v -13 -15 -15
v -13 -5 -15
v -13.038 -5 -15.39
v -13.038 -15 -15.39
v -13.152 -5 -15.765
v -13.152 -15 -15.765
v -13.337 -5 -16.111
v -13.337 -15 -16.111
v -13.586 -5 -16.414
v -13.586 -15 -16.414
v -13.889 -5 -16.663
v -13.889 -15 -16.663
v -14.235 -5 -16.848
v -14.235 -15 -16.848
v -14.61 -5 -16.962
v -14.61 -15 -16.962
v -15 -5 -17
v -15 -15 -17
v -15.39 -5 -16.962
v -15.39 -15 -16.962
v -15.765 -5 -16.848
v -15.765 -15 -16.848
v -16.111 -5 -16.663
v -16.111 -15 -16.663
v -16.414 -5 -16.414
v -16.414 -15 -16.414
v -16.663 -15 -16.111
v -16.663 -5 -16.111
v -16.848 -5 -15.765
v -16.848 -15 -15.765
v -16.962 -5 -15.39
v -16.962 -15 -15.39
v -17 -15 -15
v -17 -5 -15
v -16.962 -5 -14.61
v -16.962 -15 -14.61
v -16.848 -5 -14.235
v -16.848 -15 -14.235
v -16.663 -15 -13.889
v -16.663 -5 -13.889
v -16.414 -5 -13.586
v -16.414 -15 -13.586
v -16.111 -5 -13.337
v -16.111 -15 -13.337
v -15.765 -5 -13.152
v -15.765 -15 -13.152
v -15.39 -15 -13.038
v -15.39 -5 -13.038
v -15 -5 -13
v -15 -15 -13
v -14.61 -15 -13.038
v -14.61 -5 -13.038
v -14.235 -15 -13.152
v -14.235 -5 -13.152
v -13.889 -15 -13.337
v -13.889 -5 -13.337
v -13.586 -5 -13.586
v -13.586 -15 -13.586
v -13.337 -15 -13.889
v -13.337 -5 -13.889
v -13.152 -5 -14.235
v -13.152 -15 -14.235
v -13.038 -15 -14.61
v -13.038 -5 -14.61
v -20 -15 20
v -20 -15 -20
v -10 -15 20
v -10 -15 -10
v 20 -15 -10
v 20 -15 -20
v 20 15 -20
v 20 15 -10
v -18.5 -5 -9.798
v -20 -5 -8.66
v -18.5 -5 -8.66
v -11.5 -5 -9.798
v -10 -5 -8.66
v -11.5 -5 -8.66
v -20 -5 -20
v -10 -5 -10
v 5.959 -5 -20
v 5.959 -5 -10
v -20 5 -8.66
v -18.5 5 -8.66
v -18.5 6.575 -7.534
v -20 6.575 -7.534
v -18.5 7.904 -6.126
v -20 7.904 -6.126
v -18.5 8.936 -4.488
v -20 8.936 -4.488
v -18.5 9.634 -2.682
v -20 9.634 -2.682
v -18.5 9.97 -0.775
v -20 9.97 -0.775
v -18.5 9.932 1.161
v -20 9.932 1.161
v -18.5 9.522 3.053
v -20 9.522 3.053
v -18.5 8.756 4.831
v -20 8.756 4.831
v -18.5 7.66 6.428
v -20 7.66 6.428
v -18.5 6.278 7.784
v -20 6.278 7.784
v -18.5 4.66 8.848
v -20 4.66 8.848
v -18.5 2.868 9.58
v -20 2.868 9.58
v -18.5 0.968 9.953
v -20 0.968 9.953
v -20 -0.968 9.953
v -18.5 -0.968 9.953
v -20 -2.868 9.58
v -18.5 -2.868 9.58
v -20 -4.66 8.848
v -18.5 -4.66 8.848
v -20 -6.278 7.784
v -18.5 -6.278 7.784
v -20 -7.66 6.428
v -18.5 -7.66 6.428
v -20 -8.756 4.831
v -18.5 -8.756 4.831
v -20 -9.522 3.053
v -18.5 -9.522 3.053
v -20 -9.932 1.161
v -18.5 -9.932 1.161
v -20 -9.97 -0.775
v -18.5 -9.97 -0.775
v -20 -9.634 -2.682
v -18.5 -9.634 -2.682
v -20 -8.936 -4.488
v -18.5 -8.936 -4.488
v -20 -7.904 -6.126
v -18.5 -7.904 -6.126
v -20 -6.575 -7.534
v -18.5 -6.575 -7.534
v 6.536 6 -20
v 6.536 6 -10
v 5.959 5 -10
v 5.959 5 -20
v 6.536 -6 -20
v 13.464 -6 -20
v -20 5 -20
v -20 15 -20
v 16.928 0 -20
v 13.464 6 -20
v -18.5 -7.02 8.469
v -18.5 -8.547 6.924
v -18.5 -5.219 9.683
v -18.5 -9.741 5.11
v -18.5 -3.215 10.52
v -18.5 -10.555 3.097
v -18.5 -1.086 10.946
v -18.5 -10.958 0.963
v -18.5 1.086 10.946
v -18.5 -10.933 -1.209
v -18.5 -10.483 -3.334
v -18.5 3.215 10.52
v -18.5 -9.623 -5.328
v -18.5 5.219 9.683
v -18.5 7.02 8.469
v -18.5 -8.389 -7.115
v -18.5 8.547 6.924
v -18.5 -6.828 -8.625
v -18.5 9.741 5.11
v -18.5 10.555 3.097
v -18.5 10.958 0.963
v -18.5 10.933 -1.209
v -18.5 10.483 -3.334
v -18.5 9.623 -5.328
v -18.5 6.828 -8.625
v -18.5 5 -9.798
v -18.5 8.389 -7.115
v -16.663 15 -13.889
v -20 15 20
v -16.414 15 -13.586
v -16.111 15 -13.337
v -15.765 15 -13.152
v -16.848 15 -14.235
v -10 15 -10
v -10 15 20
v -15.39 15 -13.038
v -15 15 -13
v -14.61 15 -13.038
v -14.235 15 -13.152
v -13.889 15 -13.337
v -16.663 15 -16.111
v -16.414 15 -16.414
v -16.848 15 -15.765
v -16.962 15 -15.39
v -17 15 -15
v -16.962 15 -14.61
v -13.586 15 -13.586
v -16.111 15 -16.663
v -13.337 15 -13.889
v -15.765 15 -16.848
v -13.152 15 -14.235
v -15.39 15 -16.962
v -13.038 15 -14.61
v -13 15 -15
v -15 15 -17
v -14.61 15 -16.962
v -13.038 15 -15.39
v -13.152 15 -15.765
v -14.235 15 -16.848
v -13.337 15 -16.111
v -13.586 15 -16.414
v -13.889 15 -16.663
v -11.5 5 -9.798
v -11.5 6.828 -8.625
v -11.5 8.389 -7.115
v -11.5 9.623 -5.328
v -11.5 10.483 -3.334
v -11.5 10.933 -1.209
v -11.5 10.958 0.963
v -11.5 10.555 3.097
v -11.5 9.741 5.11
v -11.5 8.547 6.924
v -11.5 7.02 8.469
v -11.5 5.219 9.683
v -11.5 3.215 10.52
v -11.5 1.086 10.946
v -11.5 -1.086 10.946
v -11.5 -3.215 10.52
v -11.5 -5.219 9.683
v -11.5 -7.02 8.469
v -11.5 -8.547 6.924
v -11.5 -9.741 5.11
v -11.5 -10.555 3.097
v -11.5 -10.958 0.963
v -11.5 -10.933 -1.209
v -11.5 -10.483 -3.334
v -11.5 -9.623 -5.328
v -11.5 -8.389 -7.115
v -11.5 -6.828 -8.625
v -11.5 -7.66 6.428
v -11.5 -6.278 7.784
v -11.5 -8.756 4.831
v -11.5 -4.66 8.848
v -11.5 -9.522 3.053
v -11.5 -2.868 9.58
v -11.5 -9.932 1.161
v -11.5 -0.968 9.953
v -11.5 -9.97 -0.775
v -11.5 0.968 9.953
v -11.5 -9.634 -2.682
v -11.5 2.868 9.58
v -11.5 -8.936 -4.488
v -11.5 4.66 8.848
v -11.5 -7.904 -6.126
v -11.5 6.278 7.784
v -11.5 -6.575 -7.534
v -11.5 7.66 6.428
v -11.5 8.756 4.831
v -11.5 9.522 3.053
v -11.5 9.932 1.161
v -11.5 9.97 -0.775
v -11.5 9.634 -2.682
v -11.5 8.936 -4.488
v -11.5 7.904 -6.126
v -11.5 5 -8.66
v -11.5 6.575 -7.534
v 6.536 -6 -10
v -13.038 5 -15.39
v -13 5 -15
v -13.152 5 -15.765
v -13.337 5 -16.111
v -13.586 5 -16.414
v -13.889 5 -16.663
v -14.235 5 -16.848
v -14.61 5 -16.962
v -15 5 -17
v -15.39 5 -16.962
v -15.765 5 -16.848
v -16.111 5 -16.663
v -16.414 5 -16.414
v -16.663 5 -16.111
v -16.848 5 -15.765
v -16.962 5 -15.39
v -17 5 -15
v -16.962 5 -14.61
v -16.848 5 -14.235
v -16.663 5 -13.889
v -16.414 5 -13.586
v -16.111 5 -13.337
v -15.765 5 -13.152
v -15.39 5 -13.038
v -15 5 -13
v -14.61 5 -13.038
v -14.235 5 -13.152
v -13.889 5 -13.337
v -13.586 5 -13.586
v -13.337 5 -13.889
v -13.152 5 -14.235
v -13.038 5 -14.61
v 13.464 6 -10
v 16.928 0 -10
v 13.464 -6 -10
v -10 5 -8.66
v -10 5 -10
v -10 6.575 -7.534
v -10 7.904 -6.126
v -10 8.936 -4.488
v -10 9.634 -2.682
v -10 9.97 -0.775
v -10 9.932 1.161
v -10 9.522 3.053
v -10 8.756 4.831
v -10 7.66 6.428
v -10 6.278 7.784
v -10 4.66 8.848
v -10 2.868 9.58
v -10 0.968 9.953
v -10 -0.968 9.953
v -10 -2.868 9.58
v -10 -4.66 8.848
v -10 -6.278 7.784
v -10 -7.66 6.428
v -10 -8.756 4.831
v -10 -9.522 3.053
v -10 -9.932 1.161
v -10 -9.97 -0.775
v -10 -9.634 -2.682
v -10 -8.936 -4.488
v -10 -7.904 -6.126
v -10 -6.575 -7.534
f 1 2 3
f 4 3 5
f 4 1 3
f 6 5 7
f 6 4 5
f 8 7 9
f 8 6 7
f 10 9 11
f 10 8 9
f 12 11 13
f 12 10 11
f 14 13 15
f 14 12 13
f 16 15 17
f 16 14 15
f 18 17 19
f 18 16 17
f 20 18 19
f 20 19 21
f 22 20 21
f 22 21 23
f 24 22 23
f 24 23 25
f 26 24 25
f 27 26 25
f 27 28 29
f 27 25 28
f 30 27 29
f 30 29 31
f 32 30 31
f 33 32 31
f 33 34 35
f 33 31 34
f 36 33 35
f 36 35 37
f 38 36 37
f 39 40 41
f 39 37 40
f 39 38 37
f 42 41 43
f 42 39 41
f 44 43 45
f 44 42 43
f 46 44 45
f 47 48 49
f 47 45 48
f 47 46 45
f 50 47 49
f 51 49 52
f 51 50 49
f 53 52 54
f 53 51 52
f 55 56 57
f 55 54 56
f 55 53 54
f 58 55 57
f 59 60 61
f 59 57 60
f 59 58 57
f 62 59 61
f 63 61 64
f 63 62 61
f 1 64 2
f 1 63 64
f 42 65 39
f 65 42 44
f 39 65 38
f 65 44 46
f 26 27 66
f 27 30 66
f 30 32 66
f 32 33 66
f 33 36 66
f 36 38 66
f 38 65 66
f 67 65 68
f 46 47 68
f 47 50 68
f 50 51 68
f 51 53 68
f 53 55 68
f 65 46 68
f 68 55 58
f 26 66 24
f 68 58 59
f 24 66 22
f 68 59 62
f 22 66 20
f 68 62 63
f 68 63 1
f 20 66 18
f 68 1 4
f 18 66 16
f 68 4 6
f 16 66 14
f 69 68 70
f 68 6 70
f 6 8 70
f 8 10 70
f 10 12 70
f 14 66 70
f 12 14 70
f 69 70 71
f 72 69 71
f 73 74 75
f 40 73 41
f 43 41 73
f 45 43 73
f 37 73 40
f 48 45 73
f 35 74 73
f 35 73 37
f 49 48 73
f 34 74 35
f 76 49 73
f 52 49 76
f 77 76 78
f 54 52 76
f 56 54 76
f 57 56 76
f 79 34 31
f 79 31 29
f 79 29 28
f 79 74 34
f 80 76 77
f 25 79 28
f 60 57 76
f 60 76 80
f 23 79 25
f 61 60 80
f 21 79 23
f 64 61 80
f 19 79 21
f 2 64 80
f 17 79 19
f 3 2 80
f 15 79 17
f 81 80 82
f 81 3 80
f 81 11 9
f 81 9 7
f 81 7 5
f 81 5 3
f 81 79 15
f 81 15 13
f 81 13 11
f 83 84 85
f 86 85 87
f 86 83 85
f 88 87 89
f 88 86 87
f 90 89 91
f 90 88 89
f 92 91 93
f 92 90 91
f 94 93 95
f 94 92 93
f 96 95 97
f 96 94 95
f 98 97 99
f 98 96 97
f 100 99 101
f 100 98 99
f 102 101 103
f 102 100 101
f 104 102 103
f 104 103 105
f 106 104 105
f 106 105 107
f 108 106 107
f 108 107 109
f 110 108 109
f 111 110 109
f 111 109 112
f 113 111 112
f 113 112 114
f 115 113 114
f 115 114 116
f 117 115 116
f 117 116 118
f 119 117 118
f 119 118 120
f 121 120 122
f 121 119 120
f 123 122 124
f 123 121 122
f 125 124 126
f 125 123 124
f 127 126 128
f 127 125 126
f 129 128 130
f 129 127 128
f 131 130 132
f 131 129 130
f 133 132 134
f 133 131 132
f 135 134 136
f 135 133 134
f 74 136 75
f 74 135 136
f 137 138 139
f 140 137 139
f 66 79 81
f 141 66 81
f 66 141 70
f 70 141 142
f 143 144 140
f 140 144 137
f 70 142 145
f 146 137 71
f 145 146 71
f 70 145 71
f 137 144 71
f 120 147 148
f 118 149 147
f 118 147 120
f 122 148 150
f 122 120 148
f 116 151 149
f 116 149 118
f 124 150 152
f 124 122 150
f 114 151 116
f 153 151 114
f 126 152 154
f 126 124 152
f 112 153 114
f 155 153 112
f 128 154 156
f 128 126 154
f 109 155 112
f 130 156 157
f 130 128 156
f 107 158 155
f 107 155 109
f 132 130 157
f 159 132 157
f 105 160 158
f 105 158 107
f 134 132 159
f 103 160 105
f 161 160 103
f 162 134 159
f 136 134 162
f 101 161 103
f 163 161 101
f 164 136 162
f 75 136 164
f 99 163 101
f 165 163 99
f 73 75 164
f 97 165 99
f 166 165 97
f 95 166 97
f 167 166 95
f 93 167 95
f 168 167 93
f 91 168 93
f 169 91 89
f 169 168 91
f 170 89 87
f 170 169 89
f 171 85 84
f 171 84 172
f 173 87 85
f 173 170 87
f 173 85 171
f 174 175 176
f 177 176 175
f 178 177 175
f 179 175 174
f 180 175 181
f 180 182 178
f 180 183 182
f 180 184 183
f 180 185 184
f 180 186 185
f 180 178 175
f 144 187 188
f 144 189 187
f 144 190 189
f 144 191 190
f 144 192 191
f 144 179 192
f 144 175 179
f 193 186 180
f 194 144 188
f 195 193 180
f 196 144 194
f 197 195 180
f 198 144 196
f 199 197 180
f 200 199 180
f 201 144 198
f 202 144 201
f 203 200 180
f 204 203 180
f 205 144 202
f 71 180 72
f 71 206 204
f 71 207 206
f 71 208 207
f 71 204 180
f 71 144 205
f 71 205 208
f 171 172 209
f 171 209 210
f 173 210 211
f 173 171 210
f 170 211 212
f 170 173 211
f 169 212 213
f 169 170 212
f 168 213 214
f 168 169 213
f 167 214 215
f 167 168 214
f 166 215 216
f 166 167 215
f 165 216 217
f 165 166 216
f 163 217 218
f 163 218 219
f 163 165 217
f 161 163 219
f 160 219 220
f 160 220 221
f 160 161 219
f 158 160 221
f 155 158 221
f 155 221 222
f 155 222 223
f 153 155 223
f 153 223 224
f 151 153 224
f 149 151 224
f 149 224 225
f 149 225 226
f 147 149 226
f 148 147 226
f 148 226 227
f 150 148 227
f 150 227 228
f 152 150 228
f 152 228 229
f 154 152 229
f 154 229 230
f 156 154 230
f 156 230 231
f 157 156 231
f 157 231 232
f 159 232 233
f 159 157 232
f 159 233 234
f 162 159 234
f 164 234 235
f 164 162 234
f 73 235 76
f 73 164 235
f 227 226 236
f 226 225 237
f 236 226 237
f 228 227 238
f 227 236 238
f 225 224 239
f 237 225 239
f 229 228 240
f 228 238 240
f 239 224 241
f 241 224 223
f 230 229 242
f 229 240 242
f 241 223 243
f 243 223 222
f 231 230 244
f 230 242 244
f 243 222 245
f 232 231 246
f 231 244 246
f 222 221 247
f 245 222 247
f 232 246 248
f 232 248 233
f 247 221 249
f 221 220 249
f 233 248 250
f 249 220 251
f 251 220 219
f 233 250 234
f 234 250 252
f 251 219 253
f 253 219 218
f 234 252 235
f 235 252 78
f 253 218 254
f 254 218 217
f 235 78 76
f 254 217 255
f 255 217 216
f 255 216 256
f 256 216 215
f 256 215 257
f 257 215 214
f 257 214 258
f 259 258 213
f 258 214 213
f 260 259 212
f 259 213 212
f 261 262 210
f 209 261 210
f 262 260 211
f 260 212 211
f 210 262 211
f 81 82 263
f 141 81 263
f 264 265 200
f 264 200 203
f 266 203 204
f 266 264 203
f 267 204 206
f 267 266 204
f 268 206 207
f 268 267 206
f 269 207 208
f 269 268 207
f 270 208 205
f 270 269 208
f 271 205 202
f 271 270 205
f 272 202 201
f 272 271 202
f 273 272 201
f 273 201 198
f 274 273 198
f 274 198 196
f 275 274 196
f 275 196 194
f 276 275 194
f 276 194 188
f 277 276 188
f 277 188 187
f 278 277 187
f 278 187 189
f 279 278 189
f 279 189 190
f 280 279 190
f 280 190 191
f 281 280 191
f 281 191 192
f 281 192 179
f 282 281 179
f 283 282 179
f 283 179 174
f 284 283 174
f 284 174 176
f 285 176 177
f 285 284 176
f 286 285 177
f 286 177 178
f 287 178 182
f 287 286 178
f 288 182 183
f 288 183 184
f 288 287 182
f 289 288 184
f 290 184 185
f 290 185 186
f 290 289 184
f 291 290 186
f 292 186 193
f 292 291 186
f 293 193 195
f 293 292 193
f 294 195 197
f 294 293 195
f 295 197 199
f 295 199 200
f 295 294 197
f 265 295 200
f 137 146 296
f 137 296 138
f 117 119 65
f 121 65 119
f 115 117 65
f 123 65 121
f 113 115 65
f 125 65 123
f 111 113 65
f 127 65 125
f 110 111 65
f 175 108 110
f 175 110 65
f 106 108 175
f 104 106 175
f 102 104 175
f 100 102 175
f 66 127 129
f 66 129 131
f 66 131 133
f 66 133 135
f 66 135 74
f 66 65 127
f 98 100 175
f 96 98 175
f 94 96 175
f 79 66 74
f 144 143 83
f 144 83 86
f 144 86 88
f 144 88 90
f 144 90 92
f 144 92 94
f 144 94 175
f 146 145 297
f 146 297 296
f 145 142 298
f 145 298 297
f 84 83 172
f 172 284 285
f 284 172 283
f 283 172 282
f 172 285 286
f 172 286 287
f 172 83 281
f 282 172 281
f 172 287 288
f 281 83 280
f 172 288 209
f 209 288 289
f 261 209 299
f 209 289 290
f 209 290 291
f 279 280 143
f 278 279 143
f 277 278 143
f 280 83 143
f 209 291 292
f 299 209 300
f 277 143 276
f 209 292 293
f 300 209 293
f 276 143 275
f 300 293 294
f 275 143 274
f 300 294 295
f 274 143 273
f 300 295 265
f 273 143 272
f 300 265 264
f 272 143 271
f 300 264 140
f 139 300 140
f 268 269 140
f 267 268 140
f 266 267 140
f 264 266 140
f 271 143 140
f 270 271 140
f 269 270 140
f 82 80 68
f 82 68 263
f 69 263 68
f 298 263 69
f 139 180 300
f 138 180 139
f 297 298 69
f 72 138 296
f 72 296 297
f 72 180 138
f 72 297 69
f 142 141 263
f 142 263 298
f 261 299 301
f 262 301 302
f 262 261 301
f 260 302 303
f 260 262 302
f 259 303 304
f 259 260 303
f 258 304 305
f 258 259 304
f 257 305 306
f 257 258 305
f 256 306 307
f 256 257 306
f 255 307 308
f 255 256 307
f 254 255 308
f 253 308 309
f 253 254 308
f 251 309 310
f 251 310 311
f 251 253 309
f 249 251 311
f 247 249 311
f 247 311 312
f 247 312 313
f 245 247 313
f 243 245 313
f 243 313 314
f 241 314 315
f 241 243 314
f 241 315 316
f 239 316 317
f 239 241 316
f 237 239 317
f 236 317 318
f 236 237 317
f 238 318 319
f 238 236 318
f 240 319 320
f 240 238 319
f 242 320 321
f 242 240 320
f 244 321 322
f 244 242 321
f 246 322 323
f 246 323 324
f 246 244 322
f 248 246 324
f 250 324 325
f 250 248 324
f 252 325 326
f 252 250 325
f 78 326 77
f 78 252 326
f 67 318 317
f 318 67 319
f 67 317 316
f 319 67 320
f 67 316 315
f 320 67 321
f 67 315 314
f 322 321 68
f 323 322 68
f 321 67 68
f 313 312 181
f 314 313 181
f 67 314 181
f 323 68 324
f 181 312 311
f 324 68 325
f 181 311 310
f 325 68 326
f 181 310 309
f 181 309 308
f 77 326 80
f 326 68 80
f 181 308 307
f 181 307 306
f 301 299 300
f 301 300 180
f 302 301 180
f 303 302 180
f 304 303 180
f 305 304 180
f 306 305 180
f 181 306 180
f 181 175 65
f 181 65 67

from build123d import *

# Parameters (mm, degrees)
CYLINDER001_R           = 2
CYLINDER001_DEPTH       = 30
CYLINDER001_ROLL_ANGLE  = -90
CYLINDER002_R           = 11
CYLINDER002_DEPTH       = 7
CYLINDER002_PITCH_ANGLE = 90
CYLINDER003_R           = 10
CYLINDER003_DEPTH       = 10
CYLINDER003_PITCH_ANGLE = 90
PAD_DEPTH               = 10
BOX001_W                = 30
BOX001_H                = 10
BOX001_DEPTH            = 15
BOX002_W                = 10
BOX002_H                = 30
BOX002_DEPTH            = 40
BOX_W                   = 40
BOX_H                   = 30
BOX_DEPTH               = 10


with BuildPart() as cylinder001:
    # Cylinder001 → Cylinder001 (new body)
    with BuildSketch(Plane.XY):
        Circle(CYLINDER001_R)
    extrude(amount=CYLINDER001_DEPTH)


with BuildPart() as cylinder001_1:
    # Cylinder001 roll: moved
    add(cylinder001.part.rotate(Axis((0, 0, 0), (1, 0, 0)), CYLINDER001_ROLL_ANGLE))


with BuildPart() as cylinder001_2:
    # Cylinder001 placement: moved
    add(cylinder001_1.part.moved(Location((-15, -15, -15))))


with BuildPart() as bearing_cylinder:
    # Cylinder002 → Cylinder002 (new body)
    with BuildSketch(Plane.XY):
        Circle(CYLINDER002_R)
    extrude(amount=CYLINDER002_DEPTH)


with BuildPart() as bearing_cylinder_1:
    # Cylinder002 pitch: moved
    add(bearing_cylinder.part.rotate(Axis((0, 0, 0), (0, 1, 0)), CYLINDER002_PITCH_ANGLE))


with BuildPart() as bearing_cylinder_2:
    # Cylinder002 placement: moved
    add(bearing_cylinder_1.part.moved(Location((-18.5, 0, 0))))


with BuildPart() as bearing_cylinder_outer:
    # Cylinder003 → Cylinder003 (new body)
    with BuildSketch(Plane.XY):
        Circle(CYLINDER003_R)
    extrude(amount=CYLINDER003_DEPTH)


with BuildPart() as bearing_cylinder_outer_1:
    # Cylinder003 pitch: moved
    add(bearing_cylinder_outer.part.rotate(Axis((0, 0, 0), (0, 1, 0)), CYLINDER003_PITCH_ANGLE))


with BuildPart() as bearing_cylinder_outer_2:
    # Cylinder003 placement: moved
    add(bearing_cylinder_outer_1.part.moved(Location((-20, 0, 0))))


with BuildPart() as body:
    # Sketch → Pad (new body)
    with BuildSketch(Plane.XY):
        Polygon((6.928203, 0), (3.464102, 6), (-3.464102, 6), (-6.928203, 0), (-3.464102, -6), (3.464102, -6), align=None)
    extrude(amount=PAD_DEPTH)


with BuildPart() as body_1:
    # Body placement: moved
    add(body.part.moved(Location((10, 0, -20))))


with BuildPart() as negative_fusion:
    # Box001 → Box001 (new body)
    with BuildSketch(Plane(origin=(-20, -5, -20), x_dir=(1, 0, 0), z_dir=(0, 0, 1))):
        with Locations((15, 5)):
            Rectangle(BOX001_W, BOX001_H)
    extrude(amount=BOX001_DEPTH)

    # Fusion: union Cylinder001, Bearing Cylinder, Bearing Cylinder Outer, Body
    add(cylinder001_2.part)
    add(bearing_cylinder_2.part)
    add(bearing_cylinder_outer_2.part)
    add(body_1.part)


with BuildPart() as cube002:
    # Box002 → Box002 (new body)
    with BuildSketch(Plane(origin=(-20, -15, -20), x_dir=(1, 0, 0), z_dir=(0, 0, 1))):
        with Locations((5, 15)):
            Rectangle(BOX002_W, BOX002_H)
    extrude(amount=BOX002_DEPTH)


with BuildPart() as cut:
    # Box → Box (new body)
    with BuildSketch(Plane(origin=(-20, -15, -20), x_dir=(1, 0, 0), z_dir=(0, 0, 1))):
        with Locations((20, 15)):
            Rectangle(BOX_W, BOX_H)
    extrude(amount=BOX_DEPTH)

    # Fusion001: union Cube002
    add(cube002.part)

    # Cut: cut Negative Fusion
    add(negative_fusion.part, mode=Mode.SUBTRACT)


solid = cut.part
